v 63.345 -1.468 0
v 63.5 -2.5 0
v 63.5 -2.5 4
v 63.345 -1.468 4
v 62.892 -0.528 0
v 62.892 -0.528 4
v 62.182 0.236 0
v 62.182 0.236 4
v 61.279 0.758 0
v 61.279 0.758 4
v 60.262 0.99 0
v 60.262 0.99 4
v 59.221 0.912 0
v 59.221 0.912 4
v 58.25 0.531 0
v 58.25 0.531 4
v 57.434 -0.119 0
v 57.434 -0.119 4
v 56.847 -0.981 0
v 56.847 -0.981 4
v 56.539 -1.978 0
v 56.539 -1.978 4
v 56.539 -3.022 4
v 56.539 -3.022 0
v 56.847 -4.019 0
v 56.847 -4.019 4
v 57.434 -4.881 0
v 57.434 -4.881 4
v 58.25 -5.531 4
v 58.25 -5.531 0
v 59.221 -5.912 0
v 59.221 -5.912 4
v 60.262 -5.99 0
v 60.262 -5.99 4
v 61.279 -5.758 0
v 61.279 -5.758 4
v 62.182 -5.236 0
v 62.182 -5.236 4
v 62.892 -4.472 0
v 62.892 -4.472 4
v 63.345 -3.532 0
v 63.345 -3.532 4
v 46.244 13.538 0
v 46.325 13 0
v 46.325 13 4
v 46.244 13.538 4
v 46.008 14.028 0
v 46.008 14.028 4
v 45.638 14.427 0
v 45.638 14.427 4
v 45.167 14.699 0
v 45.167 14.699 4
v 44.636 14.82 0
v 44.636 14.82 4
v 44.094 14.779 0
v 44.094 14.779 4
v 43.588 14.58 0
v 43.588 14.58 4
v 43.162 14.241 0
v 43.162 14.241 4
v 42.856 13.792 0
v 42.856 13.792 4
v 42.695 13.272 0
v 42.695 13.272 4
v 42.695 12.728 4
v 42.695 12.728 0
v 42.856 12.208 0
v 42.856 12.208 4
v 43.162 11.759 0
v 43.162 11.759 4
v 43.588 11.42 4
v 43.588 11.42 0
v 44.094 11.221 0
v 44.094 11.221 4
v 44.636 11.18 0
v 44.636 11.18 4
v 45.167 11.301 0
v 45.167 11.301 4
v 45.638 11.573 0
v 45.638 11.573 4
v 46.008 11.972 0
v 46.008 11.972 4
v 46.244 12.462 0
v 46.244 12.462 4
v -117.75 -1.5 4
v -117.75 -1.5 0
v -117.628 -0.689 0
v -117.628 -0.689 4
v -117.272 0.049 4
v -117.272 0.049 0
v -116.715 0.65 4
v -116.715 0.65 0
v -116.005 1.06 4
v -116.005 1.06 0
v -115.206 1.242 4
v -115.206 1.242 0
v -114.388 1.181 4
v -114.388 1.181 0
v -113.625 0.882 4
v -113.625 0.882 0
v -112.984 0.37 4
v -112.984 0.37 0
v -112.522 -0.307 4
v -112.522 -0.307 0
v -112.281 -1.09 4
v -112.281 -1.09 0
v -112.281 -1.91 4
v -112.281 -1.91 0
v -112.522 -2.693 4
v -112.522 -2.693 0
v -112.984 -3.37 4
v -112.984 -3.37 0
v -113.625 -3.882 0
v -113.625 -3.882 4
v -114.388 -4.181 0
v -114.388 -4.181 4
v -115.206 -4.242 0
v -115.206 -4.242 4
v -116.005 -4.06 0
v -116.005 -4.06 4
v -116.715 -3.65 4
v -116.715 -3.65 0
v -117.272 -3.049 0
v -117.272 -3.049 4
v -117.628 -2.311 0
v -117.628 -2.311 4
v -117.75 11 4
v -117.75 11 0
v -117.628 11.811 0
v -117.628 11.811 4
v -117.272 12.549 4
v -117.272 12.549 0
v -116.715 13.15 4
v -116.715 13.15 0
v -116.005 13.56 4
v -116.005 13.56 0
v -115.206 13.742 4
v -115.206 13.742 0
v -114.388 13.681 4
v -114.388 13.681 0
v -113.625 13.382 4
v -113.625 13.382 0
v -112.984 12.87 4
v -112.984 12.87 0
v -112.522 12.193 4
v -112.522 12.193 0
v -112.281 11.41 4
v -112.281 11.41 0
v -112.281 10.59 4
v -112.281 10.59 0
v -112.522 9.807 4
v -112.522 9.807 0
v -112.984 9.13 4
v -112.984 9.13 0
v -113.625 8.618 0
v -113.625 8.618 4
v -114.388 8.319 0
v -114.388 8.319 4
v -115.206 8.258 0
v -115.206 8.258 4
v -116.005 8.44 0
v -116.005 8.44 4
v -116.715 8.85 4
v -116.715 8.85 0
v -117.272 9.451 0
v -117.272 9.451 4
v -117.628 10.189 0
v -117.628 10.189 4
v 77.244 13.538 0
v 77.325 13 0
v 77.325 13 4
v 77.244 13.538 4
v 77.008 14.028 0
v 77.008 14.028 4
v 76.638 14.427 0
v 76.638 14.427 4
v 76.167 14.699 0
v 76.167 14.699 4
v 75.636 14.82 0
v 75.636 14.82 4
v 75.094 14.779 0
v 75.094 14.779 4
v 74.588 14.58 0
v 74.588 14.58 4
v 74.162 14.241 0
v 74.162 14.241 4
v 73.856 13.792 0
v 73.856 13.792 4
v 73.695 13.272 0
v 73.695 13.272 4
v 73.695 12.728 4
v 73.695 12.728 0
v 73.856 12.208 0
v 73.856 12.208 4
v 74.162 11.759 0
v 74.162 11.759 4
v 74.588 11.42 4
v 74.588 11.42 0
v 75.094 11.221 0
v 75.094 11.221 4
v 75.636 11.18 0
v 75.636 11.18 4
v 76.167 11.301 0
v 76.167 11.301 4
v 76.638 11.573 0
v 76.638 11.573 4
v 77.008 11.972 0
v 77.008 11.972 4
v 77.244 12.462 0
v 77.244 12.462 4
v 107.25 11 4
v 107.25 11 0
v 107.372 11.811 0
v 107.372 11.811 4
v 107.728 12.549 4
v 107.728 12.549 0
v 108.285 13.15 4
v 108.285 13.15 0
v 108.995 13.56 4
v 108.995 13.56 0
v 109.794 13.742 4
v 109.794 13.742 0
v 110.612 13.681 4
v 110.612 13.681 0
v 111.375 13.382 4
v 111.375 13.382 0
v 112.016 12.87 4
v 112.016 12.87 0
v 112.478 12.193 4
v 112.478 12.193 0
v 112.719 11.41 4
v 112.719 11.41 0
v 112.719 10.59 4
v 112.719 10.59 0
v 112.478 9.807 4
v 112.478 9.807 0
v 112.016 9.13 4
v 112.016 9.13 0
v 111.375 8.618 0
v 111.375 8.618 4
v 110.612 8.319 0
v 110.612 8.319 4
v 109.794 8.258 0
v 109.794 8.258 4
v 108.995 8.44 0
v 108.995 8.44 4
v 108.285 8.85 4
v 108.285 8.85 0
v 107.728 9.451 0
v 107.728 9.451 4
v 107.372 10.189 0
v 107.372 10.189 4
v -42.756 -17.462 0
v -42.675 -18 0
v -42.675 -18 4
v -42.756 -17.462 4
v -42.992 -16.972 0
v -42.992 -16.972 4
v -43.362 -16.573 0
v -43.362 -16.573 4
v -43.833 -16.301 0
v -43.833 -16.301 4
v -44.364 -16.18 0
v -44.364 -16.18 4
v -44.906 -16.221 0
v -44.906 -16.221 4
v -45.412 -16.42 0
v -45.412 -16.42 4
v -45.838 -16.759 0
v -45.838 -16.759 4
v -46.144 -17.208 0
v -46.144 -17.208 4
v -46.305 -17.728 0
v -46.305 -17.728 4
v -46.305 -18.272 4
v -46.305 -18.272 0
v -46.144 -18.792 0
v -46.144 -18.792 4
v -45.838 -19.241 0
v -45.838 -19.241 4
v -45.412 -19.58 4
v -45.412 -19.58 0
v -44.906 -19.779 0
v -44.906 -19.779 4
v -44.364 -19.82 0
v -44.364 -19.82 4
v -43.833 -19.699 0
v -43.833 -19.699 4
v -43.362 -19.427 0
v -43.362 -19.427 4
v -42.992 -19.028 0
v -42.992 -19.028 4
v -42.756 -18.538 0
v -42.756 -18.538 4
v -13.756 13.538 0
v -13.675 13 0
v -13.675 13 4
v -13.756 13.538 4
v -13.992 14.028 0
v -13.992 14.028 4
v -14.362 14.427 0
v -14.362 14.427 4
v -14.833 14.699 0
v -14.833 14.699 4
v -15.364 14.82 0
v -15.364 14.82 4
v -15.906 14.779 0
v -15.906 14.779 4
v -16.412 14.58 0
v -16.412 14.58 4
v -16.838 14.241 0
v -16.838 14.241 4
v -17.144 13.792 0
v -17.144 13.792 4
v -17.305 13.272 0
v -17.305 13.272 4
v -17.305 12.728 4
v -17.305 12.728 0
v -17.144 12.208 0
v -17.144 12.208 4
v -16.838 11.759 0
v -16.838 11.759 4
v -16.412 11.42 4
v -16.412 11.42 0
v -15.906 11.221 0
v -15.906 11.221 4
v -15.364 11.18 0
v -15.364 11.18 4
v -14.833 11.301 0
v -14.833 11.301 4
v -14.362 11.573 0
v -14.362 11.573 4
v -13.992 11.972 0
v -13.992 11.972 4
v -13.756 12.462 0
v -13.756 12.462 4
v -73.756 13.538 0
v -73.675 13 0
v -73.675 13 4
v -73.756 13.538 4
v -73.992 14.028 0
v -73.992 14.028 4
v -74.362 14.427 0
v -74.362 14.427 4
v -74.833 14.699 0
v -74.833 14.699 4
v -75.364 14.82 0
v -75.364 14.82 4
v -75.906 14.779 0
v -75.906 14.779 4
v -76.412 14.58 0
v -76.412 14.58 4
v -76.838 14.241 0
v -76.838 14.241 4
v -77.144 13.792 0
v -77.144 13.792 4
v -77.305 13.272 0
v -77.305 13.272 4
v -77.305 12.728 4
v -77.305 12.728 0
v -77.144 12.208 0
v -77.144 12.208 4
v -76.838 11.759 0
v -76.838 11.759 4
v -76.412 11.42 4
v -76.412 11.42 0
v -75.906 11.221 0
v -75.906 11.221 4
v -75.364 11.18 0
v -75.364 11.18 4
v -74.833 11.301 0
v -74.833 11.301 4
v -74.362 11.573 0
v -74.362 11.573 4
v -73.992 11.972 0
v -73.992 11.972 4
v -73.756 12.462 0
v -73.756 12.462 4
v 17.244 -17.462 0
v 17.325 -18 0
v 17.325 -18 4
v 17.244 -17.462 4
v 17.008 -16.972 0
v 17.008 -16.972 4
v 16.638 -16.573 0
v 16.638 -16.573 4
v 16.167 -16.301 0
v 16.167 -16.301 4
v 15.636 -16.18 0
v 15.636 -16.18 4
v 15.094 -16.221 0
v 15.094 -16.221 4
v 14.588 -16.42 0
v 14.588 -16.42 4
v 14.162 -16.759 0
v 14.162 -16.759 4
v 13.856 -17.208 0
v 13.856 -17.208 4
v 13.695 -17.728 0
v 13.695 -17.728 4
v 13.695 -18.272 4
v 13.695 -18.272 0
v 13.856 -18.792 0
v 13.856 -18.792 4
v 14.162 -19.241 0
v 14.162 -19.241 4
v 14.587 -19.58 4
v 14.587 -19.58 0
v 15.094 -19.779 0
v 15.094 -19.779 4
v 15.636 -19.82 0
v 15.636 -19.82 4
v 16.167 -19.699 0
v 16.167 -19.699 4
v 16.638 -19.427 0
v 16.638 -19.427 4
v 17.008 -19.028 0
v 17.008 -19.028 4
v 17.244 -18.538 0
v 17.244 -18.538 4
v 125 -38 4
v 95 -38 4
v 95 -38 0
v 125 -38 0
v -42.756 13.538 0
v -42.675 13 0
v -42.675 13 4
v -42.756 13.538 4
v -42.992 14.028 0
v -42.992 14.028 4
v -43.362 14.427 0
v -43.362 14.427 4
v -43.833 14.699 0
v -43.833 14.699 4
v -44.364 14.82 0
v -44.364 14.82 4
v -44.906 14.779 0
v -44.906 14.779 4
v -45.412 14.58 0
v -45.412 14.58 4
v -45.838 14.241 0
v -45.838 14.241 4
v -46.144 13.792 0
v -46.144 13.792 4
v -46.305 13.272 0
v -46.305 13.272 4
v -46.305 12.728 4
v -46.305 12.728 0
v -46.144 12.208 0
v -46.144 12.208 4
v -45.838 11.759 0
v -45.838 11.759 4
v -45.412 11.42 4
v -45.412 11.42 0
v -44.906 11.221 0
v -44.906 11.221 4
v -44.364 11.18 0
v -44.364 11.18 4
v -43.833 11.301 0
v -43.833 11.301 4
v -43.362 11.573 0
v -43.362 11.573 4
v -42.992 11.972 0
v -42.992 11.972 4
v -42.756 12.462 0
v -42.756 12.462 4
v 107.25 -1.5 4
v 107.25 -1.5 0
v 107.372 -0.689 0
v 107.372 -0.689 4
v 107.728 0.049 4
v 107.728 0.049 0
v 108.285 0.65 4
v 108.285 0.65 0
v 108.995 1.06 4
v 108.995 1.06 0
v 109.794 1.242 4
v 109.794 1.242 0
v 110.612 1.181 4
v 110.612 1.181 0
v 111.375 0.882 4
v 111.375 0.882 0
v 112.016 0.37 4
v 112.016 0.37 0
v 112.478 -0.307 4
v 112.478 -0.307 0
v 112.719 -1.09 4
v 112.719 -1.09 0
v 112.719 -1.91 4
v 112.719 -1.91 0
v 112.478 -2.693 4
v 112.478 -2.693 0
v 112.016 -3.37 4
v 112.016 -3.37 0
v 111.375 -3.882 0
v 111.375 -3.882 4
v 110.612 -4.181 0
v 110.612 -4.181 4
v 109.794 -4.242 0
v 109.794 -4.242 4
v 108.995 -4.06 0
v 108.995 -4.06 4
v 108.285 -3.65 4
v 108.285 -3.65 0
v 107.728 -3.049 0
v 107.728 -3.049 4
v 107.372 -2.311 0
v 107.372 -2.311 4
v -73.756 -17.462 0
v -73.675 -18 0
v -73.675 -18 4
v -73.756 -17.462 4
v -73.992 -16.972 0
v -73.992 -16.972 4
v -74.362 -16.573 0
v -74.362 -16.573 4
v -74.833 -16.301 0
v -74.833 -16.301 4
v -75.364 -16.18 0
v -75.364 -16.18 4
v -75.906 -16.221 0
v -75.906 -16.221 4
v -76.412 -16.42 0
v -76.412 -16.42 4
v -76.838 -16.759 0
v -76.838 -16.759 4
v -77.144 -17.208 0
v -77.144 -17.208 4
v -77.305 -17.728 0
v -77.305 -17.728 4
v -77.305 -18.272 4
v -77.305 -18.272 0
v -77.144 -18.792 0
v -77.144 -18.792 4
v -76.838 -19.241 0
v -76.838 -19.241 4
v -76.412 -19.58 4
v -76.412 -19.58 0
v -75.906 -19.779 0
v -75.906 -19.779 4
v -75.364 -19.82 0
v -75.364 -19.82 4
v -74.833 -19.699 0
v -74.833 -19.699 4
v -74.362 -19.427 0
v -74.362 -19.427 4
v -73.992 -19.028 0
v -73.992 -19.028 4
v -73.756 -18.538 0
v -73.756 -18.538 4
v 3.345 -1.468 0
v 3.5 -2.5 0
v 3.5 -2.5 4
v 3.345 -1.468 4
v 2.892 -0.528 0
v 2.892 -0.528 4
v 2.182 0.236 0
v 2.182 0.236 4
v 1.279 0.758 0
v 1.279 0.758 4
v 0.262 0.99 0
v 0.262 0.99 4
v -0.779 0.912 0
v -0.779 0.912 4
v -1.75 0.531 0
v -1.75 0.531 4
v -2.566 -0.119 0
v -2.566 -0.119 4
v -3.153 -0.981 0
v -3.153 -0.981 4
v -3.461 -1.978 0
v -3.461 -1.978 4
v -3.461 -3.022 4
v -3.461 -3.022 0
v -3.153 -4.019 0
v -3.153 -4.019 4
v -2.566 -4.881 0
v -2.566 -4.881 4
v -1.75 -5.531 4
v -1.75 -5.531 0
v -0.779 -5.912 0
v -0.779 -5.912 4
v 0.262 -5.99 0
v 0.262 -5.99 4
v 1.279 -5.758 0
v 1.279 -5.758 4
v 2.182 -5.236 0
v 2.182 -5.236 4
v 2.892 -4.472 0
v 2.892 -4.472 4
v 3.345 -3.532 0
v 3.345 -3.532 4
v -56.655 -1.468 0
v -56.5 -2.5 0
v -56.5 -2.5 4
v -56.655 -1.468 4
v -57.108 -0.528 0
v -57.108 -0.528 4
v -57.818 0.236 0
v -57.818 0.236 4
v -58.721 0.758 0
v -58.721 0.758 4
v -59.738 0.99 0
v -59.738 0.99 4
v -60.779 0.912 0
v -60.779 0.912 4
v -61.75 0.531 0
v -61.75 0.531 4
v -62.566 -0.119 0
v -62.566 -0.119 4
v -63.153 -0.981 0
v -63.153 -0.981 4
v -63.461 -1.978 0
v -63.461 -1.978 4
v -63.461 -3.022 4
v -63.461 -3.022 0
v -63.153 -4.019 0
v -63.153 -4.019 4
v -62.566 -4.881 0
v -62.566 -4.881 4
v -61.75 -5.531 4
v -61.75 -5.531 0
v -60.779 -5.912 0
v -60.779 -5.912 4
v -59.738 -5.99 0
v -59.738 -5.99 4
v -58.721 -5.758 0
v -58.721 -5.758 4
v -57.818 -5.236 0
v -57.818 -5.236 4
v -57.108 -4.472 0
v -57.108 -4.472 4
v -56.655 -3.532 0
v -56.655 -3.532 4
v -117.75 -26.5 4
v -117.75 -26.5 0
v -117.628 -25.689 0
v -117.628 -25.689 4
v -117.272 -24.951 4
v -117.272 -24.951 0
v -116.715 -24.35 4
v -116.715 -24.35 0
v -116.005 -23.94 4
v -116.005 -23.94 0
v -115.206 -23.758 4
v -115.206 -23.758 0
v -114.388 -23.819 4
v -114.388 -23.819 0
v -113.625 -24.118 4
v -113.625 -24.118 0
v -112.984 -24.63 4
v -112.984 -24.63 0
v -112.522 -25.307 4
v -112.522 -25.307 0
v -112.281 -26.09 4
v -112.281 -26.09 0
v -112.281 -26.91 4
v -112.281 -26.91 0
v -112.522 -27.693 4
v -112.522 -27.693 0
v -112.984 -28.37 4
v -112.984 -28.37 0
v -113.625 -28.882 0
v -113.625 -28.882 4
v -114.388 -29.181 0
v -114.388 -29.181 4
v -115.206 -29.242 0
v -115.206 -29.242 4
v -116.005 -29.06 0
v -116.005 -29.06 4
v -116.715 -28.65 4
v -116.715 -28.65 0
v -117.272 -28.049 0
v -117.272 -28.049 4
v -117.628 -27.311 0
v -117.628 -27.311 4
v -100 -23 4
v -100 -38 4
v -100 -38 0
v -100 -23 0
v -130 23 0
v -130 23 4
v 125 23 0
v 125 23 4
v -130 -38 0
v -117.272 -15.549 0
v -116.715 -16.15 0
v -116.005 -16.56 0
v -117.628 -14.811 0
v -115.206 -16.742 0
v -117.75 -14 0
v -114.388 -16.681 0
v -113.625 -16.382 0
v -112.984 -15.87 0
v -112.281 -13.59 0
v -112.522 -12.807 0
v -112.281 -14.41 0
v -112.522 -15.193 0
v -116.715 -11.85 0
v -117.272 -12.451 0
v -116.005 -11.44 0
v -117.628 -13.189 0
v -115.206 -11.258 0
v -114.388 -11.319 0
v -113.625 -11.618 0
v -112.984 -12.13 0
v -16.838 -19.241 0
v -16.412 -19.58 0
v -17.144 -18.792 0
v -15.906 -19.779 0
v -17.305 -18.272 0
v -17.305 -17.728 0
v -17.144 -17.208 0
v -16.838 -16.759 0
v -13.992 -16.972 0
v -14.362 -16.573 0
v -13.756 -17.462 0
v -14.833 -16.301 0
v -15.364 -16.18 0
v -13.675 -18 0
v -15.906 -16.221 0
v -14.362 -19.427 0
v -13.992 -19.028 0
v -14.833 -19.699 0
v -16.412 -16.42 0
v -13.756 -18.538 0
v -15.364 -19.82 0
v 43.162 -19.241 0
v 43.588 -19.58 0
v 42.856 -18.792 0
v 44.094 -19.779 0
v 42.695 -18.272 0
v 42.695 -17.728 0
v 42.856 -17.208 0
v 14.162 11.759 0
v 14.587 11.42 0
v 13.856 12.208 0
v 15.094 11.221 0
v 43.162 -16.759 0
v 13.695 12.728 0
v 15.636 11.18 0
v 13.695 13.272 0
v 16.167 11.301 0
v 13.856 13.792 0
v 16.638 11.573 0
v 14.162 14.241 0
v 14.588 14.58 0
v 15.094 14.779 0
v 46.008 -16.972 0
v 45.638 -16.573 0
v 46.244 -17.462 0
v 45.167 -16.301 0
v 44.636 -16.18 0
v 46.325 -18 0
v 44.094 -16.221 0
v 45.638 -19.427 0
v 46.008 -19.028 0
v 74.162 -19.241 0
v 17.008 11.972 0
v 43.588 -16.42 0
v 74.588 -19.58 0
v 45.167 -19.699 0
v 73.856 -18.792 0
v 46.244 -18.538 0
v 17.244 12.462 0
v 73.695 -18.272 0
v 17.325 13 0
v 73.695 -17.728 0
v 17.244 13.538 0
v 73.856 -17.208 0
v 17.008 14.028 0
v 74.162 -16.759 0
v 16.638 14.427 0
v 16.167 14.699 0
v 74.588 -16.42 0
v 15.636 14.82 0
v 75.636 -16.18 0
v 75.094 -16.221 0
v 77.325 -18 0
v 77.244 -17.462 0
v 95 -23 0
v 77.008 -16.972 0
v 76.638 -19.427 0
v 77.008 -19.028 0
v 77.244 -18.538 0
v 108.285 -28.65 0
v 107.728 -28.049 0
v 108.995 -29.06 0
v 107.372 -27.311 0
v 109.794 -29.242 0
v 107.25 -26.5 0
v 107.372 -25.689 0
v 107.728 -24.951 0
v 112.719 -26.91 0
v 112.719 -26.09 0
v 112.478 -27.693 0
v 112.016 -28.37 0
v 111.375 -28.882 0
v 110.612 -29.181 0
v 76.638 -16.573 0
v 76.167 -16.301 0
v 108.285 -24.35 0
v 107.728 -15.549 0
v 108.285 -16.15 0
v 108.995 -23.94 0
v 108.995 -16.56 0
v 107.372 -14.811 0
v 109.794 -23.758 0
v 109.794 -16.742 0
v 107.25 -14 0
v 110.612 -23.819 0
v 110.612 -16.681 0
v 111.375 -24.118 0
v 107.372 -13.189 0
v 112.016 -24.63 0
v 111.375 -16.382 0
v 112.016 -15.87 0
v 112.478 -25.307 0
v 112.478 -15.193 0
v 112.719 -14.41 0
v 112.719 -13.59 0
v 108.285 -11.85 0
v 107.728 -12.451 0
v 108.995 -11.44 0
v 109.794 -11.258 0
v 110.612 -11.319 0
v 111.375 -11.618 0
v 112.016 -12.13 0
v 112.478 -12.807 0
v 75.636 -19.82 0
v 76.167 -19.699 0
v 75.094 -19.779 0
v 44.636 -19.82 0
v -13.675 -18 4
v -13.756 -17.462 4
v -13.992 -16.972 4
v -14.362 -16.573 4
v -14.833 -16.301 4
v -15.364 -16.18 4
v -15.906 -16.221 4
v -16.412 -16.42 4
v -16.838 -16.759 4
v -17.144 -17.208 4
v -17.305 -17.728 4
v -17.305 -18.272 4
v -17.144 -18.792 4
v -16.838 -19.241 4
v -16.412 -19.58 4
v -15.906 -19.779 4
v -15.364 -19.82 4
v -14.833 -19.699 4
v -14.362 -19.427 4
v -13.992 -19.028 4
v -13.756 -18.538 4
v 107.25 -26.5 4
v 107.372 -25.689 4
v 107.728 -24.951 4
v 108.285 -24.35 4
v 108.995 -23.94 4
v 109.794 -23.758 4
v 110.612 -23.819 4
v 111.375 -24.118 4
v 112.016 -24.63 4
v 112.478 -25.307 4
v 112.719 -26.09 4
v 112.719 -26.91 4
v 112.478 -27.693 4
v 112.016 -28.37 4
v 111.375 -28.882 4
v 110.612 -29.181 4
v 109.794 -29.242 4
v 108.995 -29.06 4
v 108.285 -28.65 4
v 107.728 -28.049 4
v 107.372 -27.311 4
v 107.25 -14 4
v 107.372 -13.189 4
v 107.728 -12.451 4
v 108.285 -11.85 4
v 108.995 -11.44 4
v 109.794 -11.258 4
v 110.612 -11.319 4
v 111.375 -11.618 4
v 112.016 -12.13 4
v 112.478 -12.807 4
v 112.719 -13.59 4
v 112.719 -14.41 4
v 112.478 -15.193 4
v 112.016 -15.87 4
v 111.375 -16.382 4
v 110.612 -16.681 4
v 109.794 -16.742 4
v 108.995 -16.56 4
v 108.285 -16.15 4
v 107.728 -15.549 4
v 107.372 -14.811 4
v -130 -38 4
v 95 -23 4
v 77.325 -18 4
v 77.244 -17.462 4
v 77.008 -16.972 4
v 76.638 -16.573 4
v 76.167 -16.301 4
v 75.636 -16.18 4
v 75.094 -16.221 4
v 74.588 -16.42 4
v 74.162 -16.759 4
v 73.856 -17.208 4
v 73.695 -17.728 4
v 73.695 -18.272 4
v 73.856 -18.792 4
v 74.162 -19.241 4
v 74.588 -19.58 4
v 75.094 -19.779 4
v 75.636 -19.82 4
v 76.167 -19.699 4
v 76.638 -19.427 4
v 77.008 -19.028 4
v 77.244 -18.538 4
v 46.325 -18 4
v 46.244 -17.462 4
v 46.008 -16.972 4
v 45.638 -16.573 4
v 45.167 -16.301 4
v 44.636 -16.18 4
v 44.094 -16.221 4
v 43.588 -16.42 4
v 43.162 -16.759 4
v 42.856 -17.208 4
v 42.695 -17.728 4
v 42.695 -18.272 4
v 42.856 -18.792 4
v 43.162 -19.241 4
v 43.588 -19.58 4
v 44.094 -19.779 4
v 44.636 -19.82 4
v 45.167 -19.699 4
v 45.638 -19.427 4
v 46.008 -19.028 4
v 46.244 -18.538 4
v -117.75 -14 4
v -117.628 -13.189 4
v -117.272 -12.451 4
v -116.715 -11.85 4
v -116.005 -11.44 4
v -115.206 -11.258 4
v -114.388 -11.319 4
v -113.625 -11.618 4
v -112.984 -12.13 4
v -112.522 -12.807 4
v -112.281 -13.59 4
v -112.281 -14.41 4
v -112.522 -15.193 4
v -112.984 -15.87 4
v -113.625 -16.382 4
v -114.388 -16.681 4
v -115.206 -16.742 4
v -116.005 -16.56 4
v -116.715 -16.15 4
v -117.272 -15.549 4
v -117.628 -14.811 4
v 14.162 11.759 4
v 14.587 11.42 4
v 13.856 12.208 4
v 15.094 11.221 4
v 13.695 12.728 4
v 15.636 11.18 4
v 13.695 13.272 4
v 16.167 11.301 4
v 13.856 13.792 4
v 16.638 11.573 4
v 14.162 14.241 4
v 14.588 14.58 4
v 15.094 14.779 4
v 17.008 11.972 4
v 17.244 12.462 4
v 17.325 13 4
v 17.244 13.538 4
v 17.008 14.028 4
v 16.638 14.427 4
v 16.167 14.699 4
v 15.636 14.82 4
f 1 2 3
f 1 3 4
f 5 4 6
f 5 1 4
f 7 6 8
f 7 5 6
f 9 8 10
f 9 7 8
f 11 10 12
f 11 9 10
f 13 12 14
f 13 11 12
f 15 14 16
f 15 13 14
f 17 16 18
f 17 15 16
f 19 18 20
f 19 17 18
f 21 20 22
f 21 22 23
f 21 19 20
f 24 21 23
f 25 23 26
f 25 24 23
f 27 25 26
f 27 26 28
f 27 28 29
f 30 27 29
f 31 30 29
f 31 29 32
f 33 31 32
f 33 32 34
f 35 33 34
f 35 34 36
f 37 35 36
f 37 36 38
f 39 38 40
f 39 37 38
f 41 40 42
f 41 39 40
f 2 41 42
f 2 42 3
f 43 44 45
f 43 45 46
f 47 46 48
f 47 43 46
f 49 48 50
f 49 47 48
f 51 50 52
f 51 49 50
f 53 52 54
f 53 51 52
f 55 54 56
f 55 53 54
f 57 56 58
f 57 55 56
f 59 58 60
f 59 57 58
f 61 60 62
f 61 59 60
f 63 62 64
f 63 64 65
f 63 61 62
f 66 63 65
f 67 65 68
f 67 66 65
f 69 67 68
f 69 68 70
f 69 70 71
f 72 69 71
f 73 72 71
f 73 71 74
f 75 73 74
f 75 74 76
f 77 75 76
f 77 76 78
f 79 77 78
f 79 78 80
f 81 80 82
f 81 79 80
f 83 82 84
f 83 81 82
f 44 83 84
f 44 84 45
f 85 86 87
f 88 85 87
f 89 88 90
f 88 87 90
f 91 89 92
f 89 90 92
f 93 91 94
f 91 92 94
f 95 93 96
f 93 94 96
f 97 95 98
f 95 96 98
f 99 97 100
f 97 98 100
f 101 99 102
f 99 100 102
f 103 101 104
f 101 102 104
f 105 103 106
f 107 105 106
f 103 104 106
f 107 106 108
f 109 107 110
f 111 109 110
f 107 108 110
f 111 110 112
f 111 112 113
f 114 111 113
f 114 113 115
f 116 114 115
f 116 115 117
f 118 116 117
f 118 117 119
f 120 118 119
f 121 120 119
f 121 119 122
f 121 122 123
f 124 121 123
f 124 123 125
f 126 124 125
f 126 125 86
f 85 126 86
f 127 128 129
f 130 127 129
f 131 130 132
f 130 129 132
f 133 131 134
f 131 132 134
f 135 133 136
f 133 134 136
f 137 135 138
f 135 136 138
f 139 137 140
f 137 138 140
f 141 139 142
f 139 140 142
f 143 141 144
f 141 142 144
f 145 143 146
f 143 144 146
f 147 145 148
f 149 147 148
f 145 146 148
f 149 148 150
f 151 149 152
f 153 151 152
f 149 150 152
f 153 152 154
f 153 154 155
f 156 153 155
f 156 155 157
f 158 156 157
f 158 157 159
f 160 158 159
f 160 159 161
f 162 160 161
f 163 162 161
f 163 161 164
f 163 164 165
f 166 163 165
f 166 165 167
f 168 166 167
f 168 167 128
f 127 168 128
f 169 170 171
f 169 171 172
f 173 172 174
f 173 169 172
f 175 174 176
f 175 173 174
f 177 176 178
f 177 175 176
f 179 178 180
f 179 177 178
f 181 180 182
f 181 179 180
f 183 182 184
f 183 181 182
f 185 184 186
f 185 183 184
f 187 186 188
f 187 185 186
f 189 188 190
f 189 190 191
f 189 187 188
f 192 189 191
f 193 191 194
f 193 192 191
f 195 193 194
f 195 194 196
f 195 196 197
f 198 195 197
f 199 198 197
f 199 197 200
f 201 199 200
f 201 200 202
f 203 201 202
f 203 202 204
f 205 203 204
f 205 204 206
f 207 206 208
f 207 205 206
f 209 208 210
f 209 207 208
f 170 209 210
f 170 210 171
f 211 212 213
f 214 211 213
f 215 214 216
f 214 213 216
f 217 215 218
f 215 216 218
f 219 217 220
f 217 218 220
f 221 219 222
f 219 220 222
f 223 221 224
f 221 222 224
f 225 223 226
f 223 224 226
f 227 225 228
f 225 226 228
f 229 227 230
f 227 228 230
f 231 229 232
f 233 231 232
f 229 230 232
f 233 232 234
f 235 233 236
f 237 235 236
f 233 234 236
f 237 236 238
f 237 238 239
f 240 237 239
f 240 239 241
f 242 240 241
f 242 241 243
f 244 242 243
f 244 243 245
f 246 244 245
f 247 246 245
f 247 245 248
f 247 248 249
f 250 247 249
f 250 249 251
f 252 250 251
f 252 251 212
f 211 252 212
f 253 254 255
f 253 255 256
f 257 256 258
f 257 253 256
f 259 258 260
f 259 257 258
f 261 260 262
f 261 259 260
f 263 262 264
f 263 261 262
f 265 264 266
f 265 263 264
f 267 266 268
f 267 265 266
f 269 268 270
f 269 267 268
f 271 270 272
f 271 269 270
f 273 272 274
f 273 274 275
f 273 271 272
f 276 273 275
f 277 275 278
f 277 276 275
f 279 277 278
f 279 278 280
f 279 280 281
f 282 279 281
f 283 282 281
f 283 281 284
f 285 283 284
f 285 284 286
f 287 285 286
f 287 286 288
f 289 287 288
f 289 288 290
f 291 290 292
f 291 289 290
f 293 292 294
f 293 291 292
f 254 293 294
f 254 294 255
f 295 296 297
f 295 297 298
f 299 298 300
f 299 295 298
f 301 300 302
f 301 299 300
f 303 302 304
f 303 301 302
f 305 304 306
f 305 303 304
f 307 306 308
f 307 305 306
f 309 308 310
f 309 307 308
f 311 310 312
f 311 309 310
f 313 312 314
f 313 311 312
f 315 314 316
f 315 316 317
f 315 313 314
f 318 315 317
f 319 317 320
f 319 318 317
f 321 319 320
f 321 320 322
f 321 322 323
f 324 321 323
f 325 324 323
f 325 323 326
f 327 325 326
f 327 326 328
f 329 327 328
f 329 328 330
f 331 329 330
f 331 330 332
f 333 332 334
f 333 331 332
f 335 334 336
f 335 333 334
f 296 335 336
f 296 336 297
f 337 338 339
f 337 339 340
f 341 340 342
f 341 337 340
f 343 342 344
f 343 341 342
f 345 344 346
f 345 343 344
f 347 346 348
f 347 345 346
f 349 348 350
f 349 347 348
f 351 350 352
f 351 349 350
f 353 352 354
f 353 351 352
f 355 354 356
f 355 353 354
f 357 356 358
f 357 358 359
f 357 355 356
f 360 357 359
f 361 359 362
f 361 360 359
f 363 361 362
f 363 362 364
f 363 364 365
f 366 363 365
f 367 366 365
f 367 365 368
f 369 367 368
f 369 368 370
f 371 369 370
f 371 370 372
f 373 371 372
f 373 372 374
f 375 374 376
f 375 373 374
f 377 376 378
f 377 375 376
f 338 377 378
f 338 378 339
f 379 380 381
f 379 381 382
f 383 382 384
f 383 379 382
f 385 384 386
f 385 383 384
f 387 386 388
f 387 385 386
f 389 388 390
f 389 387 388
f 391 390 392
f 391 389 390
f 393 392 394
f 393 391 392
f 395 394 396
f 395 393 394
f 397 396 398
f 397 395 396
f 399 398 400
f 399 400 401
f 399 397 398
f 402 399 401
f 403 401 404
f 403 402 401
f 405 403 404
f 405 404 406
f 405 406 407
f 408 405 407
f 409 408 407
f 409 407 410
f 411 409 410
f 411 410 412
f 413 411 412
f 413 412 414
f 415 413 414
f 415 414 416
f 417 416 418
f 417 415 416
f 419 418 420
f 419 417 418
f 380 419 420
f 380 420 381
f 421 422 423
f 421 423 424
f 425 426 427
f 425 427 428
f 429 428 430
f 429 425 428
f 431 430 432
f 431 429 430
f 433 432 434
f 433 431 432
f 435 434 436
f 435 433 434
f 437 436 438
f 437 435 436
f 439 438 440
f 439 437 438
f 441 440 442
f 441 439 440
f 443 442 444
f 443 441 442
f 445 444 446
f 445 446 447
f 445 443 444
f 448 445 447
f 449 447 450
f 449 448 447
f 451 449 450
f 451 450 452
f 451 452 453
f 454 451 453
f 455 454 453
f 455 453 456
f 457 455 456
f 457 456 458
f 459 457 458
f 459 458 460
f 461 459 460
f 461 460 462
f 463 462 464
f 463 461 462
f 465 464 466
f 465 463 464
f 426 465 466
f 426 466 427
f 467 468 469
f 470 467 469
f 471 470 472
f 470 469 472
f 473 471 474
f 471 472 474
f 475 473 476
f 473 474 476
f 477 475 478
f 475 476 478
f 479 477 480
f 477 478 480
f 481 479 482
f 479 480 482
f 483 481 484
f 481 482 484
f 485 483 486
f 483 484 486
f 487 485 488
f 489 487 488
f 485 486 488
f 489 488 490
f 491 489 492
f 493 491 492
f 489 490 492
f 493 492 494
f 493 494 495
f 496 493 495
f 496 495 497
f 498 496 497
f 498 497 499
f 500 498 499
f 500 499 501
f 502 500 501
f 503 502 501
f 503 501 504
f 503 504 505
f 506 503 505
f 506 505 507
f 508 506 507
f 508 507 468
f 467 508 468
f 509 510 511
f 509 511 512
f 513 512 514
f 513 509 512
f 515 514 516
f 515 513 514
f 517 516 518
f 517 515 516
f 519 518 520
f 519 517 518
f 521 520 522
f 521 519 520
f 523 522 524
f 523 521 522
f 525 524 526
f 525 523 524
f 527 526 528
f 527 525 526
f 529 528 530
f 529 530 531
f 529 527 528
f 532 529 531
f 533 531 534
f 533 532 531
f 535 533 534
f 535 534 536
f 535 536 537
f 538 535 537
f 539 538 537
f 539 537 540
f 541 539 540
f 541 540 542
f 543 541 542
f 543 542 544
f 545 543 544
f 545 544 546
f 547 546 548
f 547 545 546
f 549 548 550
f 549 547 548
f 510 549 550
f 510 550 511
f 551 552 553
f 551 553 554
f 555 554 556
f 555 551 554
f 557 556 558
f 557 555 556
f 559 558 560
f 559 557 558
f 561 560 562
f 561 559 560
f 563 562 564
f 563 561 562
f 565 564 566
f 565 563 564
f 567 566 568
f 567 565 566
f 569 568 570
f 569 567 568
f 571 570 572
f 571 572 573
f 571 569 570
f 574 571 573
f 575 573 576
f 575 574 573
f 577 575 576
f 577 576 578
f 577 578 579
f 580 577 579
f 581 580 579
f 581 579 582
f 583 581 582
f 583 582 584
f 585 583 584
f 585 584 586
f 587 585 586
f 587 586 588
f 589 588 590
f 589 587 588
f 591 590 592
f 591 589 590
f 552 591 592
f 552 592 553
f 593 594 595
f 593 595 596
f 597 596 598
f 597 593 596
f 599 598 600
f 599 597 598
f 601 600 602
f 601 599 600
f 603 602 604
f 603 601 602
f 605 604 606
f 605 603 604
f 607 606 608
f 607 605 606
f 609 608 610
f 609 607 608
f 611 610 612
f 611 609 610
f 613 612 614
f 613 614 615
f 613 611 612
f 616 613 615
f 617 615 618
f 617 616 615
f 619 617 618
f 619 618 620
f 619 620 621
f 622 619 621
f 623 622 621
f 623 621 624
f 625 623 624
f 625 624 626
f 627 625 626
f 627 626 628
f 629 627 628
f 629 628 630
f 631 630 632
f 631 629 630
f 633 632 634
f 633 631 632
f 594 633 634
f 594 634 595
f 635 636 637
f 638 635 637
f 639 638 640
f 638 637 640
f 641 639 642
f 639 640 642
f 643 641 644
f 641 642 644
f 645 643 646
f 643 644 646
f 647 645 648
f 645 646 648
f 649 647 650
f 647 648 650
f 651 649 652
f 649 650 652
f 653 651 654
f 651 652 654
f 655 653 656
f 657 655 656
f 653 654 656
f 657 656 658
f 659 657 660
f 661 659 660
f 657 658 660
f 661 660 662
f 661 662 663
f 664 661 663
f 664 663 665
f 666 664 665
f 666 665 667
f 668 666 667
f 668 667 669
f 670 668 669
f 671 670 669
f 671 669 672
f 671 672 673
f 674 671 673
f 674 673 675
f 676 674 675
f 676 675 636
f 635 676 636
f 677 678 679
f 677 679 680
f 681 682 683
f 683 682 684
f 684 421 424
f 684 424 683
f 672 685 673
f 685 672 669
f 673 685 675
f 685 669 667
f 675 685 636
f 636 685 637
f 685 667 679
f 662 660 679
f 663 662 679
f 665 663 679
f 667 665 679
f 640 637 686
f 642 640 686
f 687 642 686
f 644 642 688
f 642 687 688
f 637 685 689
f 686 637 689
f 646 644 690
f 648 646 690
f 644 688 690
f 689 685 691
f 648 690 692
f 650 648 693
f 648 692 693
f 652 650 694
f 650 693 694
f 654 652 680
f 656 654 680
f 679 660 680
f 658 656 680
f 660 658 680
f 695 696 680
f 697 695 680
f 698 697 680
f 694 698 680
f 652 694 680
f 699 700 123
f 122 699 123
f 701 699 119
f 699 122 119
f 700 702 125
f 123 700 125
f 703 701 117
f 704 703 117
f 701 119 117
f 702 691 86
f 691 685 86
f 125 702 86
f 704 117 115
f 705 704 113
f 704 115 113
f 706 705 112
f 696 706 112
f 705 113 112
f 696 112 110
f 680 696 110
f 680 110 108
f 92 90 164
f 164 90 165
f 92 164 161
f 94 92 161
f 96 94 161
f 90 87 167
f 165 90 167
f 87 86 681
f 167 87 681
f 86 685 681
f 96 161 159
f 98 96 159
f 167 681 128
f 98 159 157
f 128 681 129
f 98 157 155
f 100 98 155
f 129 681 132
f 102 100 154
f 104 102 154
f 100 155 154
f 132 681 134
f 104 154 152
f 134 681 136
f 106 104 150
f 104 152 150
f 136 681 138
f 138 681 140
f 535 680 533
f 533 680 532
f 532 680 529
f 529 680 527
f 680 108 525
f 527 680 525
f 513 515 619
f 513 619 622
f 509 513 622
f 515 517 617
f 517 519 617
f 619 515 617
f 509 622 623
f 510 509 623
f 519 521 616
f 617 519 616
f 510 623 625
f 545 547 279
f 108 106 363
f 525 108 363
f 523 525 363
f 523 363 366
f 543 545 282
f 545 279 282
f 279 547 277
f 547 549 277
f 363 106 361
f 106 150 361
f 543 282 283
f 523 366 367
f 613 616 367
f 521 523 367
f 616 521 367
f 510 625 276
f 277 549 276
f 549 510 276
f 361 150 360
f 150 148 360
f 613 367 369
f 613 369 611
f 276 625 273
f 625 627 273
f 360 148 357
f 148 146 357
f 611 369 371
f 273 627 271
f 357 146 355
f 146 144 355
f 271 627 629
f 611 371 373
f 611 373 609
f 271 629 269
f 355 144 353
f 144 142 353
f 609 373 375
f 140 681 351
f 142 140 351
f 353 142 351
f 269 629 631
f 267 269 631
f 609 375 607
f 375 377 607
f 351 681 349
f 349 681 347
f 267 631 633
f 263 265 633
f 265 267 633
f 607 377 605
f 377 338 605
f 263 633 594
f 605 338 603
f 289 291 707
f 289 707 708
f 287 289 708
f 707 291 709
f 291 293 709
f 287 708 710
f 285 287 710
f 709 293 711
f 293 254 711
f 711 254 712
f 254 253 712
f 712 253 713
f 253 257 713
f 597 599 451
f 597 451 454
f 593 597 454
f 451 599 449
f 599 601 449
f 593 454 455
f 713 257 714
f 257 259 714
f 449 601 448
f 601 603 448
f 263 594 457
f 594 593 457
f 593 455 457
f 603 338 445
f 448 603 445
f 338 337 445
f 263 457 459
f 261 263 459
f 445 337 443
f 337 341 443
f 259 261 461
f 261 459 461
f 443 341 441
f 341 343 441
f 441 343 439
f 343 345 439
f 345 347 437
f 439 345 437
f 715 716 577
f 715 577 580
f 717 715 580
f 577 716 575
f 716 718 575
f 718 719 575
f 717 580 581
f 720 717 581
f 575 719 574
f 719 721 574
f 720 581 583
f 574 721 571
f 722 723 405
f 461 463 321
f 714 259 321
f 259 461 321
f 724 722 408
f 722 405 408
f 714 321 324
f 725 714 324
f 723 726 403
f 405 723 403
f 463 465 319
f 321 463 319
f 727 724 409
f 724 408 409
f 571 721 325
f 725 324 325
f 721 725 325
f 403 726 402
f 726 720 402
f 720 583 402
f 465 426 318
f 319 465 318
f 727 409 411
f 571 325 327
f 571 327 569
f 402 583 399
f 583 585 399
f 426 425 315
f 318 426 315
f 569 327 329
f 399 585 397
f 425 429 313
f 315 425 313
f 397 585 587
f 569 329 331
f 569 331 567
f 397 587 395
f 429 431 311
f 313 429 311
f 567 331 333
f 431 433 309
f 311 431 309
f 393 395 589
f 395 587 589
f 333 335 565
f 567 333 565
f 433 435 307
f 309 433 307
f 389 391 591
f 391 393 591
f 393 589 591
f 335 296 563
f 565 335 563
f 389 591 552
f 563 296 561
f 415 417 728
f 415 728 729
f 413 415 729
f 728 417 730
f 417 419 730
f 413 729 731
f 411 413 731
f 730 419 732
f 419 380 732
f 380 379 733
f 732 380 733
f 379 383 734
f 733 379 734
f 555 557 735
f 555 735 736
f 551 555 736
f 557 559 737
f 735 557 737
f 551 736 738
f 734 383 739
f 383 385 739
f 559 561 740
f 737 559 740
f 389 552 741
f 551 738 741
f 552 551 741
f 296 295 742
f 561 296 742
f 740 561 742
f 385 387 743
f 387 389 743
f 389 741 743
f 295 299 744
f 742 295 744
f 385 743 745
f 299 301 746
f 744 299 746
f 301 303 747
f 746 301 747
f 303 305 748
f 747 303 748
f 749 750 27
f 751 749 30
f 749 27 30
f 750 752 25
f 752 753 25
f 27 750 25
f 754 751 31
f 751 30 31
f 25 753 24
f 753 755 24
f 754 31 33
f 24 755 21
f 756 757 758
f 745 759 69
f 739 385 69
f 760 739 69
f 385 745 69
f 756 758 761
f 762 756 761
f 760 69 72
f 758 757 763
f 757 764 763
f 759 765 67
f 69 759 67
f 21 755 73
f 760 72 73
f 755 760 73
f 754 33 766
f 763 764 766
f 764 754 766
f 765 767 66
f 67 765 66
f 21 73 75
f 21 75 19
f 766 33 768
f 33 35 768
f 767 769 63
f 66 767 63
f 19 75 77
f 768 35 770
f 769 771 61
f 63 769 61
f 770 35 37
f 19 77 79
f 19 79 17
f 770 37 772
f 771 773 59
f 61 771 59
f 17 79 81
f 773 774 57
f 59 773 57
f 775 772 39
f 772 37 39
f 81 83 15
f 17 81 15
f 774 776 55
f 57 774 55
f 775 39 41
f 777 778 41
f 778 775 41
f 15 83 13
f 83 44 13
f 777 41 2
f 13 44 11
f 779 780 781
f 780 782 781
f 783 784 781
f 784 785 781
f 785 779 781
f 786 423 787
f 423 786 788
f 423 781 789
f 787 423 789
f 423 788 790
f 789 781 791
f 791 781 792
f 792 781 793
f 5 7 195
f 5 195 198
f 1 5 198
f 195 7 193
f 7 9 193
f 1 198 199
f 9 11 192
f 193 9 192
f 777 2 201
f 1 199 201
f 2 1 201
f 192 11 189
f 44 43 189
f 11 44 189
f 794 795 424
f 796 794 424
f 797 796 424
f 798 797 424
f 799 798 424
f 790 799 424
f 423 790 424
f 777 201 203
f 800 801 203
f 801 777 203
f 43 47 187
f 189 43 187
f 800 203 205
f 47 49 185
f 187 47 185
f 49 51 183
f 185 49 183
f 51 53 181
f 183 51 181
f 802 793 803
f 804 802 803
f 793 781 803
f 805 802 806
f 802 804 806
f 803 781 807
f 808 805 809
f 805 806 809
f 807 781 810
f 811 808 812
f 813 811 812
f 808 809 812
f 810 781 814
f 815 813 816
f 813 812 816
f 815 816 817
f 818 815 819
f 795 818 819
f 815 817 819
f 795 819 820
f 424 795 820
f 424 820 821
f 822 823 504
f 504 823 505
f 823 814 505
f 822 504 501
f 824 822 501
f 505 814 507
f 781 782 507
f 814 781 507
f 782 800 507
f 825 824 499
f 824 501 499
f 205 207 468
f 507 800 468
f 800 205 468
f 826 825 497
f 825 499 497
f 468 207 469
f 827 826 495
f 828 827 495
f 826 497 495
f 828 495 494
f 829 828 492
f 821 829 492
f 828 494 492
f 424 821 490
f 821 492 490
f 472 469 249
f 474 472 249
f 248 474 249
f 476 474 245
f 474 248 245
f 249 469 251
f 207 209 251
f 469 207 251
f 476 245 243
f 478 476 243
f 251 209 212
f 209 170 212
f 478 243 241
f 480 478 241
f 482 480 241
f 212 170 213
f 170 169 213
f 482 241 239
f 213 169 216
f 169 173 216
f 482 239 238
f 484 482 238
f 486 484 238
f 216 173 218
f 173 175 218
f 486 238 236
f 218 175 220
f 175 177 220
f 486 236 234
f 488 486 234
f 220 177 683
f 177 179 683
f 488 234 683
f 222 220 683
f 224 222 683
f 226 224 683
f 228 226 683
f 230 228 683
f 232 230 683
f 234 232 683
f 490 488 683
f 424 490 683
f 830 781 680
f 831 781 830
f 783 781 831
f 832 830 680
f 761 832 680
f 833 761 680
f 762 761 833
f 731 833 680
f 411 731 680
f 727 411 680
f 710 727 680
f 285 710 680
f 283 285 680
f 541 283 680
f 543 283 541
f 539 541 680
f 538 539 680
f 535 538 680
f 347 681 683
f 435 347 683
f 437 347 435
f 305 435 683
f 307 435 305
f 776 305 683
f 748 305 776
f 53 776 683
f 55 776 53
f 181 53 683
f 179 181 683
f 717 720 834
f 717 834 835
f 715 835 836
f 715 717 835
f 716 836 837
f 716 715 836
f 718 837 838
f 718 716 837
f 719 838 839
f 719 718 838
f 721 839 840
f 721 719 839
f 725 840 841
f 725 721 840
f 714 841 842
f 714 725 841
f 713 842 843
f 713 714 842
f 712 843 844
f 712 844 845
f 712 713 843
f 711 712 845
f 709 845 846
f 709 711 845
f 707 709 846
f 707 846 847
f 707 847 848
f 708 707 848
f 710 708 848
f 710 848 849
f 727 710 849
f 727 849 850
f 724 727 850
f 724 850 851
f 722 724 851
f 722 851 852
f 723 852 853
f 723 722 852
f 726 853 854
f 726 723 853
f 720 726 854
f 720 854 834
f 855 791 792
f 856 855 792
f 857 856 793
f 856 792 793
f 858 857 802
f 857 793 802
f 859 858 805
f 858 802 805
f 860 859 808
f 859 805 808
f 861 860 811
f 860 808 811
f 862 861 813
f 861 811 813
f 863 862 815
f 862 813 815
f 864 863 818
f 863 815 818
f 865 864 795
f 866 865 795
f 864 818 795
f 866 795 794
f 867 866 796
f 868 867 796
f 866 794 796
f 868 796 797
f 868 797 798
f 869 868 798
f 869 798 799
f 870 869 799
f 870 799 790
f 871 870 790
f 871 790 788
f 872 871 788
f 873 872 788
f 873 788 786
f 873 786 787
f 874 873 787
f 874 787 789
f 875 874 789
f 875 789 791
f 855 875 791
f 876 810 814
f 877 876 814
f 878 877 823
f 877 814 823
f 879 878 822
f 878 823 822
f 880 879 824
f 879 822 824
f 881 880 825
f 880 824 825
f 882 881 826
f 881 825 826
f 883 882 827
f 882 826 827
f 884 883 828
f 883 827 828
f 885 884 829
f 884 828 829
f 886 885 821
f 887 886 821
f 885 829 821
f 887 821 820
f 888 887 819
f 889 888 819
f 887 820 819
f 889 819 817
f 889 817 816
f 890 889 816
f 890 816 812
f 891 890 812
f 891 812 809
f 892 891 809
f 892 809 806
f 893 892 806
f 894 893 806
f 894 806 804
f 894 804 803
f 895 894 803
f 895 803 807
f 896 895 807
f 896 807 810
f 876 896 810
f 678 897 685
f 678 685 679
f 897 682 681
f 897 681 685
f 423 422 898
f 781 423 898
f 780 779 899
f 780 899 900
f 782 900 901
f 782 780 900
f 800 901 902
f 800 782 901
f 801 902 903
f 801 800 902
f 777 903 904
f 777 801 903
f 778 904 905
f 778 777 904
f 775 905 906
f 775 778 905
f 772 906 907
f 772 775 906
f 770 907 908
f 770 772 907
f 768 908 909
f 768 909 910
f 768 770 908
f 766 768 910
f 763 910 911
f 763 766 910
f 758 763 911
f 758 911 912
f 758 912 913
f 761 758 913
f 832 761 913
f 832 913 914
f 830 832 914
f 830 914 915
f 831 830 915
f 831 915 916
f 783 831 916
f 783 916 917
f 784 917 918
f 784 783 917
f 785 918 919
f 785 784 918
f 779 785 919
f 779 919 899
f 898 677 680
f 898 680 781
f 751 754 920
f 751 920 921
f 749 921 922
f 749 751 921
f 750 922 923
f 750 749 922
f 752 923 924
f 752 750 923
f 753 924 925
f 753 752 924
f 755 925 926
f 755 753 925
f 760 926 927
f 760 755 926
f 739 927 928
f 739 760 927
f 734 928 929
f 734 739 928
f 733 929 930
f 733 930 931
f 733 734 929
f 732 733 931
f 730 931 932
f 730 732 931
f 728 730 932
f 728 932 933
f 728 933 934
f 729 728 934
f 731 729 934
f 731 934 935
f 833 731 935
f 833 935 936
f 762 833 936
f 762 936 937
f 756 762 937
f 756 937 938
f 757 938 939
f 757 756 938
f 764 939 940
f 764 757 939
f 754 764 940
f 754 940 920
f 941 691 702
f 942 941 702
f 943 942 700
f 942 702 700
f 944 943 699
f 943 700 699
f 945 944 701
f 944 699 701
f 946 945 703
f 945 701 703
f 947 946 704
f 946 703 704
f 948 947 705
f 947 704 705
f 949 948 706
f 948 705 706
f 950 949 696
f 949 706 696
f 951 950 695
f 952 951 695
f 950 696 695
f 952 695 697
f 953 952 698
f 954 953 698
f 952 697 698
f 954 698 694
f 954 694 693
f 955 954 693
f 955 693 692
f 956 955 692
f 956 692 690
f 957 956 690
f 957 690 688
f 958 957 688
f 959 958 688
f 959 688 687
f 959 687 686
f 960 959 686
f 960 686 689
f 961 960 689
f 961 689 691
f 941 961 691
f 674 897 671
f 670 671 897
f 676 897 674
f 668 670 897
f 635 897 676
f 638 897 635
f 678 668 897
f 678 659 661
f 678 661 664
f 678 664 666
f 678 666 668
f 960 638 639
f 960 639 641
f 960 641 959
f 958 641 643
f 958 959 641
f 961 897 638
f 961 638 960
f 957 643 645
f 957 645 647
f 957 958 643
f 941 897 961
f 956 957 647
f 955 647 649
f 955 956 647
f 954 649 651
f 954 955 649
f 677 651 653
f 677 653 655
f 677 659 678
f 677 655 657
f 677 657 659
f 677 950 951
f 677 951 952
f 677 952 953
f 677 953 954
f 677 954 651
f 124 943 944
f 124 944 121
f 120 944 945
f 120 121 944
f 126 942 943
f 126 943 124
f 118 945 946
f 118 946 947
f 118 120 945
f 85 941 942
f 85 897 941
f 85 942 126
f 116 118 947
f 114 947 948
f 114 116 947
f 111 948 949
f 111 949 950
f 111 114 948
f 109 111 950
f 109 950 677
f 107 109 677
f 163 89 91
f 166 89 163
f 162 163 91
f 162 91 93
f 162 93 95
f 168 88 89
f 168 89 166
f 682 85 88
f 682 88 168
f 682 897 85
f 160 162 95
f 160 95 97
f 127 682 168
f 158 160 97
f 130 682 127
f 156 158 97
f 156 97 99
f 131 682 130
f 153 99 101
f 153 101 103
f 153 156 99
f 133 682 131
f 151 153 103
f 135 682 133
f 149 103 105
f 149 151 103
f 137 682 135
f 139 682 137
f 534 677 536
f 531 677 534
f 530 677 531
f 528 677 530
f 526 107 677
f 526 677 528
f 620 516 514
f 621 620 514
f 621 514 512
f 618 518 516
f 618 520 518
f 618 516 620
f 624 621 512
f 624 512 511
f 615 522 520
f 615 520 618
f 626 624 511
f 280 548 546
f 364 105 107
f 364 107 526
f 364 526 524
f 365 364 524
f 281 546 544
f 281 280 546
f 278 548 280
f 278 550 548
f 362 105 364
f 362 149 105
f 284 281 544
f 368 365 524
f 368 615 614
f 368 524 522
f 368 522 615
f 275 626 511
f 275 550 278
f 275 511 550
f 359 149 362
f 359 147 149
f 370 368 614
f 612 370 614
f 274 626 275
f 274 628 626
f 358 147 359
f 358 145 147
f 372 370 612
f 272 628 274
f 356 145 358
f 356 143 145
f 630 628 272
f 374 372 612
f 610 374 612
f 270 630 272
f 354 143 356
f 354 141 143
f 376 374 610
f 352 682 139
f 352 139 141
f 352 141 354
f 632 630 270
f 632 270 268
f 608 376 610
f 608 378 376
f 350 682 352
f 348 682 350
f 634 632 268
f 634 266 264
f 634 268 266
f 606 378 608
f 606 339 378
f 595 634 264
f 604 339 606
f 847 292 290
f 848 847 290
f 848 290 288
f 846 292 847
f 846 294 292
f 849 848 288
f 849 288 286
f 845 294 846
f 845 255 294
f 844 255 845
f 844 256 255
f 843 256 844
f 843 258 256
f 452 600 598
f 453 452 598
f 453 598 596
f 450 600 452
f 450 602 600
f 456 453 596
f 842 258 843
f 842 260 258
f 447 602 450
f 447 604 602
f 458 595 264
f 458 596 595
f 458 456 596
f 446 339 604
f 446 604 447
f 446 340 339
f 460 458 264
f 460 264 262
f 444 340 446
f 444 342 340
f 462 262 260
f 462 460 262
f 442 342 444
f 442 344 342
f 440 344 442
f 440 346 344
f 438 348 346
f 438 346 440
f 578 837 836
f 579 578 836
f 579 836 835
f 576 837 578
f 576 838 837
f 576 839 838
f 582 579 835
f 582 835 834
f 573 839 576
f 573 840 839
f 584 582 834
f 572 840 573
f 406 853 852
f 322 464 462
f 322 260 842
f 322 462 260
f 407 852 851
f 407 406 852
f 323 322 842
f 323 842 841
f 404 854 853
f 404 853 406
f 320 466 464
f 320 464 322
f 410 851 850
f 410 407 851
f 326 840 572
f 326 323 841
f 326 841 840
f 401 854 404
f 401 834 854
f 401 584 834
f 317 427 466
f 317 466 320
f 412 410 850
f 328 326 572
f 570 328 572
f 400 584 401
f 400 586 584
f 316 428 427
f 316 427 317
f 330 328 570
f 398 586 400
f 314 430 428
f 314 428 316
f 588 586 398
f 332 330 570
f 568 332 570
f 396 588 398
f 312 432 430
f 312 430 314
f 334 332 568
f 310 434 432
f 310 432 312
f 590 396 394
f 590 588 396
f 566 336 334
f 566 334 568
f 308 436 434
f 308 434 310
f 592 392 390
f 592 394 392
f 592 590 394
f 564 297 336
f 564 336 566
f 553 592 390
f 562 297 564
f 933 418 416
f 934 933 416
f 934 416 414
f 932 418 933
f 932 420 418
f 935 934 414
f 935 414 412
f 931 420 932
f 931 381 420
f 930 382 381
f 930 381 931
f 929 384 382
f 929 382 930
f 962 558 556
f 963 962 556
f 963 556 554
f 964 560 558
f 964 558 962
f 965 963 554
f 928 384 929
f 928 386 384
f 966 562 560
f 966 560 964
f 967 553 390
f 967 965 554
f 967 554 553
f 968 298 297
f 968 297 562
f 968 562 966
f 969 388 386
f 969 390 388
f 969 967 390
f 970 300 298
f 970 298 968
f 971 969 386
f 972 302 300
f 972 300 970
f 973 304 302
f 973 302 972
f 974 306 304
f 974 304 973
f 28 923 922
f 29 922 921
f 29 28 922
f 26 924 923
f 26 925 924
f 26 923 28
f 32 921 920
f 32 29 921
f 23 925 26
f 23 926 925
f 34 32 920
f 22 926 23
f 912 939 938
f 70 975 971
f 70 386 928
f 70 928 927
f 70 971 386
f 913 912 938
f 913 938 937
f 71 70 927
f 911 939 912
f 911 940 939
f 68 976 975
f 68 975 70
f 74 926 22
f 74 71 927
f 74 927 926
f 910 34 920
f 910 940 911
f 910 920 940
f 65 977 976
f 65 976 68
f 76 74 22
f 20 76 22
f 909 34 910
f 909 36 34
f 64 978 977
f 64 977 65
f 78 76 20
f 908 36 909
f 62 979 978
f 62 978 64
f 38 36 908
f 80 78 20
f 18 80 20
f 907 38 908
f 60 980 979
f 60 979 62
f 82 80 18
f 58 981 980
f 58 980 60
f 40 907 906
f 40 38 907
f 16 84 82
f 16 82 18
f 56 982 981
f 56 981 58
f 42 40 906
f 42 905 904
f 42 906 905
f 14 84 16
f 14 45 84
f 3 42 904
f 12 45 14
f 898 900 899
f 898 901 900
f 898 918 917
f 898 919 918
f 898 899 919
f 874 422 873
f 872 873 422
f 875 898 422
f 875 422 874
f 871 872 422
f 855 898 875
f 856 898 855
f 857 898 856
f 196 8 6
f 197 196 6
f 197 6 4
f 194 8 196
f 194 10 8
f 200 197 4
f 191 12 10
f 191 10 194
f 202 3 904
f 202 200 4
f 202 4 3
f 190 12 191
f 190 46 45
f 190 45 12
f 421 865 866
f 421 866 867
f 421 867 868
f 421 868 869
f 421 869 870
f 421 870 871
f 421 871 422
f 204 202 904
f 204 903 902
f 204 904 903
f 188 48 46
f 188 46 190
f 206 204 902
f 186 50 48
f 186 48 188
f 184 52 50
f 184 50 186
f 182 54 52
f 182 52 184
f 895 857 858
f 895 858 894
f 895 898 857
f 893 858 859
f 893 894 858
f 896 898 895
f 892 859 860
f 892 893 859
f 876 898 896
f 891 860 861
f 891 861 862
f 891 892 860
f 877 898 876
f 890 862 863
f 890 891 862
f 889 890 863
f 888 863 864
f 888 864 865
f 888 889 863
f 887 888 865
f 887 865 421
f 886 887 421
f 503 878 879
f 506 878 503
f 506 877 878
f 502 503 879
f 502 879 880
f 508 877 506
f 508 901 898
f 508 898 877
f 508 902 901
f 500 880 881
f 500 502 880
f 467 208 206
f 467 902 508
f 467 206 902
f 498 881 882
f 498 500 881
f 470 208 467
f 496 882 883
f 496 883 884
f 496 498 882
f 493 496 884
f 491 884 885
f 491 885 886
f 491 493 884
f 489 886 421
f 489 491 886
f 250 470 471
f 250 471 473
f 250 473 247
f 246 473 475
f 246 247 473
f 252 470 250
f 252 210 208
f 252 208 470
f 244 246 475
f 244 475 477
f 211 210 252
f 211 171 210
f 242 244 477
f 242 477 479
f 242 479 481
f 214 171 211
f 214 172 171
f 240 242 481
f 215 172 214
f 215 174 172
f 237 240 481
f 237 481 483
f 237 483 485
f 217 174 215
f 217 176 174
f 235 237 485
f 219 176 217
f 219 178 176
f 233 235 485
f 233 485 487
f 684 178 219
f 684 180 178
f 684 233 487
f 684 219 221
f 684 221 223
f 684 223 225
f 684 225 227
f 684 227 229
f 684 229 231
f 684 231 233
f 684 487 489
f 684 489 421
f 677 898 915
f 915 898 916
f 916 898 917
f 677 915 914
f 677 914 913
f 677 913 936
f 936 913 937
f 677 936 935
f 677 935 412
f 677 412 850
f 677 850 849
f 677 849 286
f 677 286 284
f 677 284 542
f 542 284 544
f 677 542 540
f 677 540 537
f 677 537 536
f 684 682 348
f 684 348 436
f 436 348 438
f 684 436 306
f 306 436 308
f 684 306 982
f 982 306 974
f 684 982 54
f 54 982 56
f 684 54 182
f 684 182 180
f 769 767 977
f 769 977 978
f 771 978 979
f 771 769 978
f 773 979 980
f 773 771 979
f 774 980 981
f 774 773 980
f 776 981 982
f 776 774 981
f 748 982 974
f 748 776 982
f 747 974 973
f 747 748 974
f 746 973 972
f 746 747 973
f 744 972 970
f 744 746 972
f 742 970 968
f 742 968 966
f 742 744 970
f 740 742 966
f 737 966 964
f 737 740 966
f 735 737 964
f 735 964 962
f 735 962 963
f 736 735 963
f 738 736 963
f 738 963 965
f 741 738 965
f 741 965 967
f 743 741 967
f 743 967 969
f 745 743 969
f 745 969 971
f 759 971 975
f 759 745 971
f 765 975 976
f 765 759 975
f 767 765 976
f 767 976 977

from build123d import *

# Parameters (mm, degrees)
SKETCH1_W            = 161
SKETCH1_H            = 46
SKETCH1_R            = 1.825
SKETCH1_R_2          = 3.5
BOSS_EXTRUDE1_DEPTH  = 4
SKETCH2_W            = 49.5
SKETCH2_H            = 46
SKETCH2_W_2          = 30
SKETCH2_H_2          = 15
SKETCH2_W_3          = 44.5
BOSS_EXTRUDE2_DEPTH  = 4
M5_CLEARANCE_HOLE1_D = 5.5


with BuildPart() as part:
    # Sketch1 → Boss-Extrude1 (new body)
    with BuildSketch(Plane.XY):
        Rectangle(SKETCH1_W, SKETCH1_H)
        with Locations((-75.5, 13)):
            Circle(SKETCH1_R, mode=Mode.SUBTRACT)
        with Locations((-44.5, 13)):
            Circle(SKETCH1_R, mode=Mode.SUBTRACT)
        with Locations((-75.5, -18)):
            Circle(SKETCH1_R, mode=Mode.SUBTRACT)
        with Locations((-44.5, -18)):
            Circle(SKETCH1_R, mode=Mode.SUBTRACT)
        with Locations((60, -2.5)):
            Circle(SKETCH1_R_2, mode=Mode.SUBTRACT)
        with Locations((-15.5, 13)):
            Circle(SKETCH1_R, mode=Mode.SUBTRACT)
        with Locations((15.5, 13)):
            Circle(SKETCH1_R, mode=Mode.SUBTRACT)
        with Locations((-15.5, -18)):
            Circle(SKETCH1_R, mode=Mode.SUBTRACT)
        with Locations((15.5, -18)):
            Circle(SKETCH1_R, mode=Mode.SUBTRACT)
        with Locations((44.5, -18)):
            Circle(SKETCH1_R, mode=Mode.SUBTRACT)
        with Locations((75.5, -18)):
            Circle(SKETCH1_R, mode=Mode.SUBTRACT)
        with Locations((-60, -2.5)):
            Circle(SKETCH1_R_2, mode=Mode.SUBTRACT)
        with Locations((0, -2.5)):
            Circle(SKETCH1_R_2, mode=Mode.SUBTRACT)
        with Locations((44.5, 13)):
            Circle(SKETCH1_R, mode=Mode.SUBTRACT)
        with Locations((75.5, 13)):
            Circle(SKETCH1_R, mode=Mode.SUBTRACT)
    extrude(amount=BOSS_EXTRUDE1_DEPTH)

    # Sketch2 → Boss-Extrude2 (add)
    with BuildSketch(Plane.XY.offset(4)):
        with Locations((-105.25, 0)):
            Rectangle(SKETCH2_W, SKETCH2_H)
        with Locations((-115, -30.5)):
            Rectangle(SKETCH2_W_2, SKETCH2_H_2)
        with Locations((102.75, 0)):
            Rectangle(SKETCH2_W_3, SKETCH2_H)
        with Locations((110, -30.5)):
            Rectangle(SKETCH2_W_2, SKETCH2_H_2)
    extrude(amount=-BOSS_EXTRUDE2_DEPTH)

    # M5 Clearance Hole1 (through all)
    with Locations(Plane.XY.offset(4)):
        with Locations((-115, -1.5), (-115, -26.5), (110, -1.5), (110, -26.5), (-115, 11), (110, 11), (110, -14), (-115, -14)):
            Hole(M5_CLEARANCE_HOLE1_D / 2)


solid = part.part
